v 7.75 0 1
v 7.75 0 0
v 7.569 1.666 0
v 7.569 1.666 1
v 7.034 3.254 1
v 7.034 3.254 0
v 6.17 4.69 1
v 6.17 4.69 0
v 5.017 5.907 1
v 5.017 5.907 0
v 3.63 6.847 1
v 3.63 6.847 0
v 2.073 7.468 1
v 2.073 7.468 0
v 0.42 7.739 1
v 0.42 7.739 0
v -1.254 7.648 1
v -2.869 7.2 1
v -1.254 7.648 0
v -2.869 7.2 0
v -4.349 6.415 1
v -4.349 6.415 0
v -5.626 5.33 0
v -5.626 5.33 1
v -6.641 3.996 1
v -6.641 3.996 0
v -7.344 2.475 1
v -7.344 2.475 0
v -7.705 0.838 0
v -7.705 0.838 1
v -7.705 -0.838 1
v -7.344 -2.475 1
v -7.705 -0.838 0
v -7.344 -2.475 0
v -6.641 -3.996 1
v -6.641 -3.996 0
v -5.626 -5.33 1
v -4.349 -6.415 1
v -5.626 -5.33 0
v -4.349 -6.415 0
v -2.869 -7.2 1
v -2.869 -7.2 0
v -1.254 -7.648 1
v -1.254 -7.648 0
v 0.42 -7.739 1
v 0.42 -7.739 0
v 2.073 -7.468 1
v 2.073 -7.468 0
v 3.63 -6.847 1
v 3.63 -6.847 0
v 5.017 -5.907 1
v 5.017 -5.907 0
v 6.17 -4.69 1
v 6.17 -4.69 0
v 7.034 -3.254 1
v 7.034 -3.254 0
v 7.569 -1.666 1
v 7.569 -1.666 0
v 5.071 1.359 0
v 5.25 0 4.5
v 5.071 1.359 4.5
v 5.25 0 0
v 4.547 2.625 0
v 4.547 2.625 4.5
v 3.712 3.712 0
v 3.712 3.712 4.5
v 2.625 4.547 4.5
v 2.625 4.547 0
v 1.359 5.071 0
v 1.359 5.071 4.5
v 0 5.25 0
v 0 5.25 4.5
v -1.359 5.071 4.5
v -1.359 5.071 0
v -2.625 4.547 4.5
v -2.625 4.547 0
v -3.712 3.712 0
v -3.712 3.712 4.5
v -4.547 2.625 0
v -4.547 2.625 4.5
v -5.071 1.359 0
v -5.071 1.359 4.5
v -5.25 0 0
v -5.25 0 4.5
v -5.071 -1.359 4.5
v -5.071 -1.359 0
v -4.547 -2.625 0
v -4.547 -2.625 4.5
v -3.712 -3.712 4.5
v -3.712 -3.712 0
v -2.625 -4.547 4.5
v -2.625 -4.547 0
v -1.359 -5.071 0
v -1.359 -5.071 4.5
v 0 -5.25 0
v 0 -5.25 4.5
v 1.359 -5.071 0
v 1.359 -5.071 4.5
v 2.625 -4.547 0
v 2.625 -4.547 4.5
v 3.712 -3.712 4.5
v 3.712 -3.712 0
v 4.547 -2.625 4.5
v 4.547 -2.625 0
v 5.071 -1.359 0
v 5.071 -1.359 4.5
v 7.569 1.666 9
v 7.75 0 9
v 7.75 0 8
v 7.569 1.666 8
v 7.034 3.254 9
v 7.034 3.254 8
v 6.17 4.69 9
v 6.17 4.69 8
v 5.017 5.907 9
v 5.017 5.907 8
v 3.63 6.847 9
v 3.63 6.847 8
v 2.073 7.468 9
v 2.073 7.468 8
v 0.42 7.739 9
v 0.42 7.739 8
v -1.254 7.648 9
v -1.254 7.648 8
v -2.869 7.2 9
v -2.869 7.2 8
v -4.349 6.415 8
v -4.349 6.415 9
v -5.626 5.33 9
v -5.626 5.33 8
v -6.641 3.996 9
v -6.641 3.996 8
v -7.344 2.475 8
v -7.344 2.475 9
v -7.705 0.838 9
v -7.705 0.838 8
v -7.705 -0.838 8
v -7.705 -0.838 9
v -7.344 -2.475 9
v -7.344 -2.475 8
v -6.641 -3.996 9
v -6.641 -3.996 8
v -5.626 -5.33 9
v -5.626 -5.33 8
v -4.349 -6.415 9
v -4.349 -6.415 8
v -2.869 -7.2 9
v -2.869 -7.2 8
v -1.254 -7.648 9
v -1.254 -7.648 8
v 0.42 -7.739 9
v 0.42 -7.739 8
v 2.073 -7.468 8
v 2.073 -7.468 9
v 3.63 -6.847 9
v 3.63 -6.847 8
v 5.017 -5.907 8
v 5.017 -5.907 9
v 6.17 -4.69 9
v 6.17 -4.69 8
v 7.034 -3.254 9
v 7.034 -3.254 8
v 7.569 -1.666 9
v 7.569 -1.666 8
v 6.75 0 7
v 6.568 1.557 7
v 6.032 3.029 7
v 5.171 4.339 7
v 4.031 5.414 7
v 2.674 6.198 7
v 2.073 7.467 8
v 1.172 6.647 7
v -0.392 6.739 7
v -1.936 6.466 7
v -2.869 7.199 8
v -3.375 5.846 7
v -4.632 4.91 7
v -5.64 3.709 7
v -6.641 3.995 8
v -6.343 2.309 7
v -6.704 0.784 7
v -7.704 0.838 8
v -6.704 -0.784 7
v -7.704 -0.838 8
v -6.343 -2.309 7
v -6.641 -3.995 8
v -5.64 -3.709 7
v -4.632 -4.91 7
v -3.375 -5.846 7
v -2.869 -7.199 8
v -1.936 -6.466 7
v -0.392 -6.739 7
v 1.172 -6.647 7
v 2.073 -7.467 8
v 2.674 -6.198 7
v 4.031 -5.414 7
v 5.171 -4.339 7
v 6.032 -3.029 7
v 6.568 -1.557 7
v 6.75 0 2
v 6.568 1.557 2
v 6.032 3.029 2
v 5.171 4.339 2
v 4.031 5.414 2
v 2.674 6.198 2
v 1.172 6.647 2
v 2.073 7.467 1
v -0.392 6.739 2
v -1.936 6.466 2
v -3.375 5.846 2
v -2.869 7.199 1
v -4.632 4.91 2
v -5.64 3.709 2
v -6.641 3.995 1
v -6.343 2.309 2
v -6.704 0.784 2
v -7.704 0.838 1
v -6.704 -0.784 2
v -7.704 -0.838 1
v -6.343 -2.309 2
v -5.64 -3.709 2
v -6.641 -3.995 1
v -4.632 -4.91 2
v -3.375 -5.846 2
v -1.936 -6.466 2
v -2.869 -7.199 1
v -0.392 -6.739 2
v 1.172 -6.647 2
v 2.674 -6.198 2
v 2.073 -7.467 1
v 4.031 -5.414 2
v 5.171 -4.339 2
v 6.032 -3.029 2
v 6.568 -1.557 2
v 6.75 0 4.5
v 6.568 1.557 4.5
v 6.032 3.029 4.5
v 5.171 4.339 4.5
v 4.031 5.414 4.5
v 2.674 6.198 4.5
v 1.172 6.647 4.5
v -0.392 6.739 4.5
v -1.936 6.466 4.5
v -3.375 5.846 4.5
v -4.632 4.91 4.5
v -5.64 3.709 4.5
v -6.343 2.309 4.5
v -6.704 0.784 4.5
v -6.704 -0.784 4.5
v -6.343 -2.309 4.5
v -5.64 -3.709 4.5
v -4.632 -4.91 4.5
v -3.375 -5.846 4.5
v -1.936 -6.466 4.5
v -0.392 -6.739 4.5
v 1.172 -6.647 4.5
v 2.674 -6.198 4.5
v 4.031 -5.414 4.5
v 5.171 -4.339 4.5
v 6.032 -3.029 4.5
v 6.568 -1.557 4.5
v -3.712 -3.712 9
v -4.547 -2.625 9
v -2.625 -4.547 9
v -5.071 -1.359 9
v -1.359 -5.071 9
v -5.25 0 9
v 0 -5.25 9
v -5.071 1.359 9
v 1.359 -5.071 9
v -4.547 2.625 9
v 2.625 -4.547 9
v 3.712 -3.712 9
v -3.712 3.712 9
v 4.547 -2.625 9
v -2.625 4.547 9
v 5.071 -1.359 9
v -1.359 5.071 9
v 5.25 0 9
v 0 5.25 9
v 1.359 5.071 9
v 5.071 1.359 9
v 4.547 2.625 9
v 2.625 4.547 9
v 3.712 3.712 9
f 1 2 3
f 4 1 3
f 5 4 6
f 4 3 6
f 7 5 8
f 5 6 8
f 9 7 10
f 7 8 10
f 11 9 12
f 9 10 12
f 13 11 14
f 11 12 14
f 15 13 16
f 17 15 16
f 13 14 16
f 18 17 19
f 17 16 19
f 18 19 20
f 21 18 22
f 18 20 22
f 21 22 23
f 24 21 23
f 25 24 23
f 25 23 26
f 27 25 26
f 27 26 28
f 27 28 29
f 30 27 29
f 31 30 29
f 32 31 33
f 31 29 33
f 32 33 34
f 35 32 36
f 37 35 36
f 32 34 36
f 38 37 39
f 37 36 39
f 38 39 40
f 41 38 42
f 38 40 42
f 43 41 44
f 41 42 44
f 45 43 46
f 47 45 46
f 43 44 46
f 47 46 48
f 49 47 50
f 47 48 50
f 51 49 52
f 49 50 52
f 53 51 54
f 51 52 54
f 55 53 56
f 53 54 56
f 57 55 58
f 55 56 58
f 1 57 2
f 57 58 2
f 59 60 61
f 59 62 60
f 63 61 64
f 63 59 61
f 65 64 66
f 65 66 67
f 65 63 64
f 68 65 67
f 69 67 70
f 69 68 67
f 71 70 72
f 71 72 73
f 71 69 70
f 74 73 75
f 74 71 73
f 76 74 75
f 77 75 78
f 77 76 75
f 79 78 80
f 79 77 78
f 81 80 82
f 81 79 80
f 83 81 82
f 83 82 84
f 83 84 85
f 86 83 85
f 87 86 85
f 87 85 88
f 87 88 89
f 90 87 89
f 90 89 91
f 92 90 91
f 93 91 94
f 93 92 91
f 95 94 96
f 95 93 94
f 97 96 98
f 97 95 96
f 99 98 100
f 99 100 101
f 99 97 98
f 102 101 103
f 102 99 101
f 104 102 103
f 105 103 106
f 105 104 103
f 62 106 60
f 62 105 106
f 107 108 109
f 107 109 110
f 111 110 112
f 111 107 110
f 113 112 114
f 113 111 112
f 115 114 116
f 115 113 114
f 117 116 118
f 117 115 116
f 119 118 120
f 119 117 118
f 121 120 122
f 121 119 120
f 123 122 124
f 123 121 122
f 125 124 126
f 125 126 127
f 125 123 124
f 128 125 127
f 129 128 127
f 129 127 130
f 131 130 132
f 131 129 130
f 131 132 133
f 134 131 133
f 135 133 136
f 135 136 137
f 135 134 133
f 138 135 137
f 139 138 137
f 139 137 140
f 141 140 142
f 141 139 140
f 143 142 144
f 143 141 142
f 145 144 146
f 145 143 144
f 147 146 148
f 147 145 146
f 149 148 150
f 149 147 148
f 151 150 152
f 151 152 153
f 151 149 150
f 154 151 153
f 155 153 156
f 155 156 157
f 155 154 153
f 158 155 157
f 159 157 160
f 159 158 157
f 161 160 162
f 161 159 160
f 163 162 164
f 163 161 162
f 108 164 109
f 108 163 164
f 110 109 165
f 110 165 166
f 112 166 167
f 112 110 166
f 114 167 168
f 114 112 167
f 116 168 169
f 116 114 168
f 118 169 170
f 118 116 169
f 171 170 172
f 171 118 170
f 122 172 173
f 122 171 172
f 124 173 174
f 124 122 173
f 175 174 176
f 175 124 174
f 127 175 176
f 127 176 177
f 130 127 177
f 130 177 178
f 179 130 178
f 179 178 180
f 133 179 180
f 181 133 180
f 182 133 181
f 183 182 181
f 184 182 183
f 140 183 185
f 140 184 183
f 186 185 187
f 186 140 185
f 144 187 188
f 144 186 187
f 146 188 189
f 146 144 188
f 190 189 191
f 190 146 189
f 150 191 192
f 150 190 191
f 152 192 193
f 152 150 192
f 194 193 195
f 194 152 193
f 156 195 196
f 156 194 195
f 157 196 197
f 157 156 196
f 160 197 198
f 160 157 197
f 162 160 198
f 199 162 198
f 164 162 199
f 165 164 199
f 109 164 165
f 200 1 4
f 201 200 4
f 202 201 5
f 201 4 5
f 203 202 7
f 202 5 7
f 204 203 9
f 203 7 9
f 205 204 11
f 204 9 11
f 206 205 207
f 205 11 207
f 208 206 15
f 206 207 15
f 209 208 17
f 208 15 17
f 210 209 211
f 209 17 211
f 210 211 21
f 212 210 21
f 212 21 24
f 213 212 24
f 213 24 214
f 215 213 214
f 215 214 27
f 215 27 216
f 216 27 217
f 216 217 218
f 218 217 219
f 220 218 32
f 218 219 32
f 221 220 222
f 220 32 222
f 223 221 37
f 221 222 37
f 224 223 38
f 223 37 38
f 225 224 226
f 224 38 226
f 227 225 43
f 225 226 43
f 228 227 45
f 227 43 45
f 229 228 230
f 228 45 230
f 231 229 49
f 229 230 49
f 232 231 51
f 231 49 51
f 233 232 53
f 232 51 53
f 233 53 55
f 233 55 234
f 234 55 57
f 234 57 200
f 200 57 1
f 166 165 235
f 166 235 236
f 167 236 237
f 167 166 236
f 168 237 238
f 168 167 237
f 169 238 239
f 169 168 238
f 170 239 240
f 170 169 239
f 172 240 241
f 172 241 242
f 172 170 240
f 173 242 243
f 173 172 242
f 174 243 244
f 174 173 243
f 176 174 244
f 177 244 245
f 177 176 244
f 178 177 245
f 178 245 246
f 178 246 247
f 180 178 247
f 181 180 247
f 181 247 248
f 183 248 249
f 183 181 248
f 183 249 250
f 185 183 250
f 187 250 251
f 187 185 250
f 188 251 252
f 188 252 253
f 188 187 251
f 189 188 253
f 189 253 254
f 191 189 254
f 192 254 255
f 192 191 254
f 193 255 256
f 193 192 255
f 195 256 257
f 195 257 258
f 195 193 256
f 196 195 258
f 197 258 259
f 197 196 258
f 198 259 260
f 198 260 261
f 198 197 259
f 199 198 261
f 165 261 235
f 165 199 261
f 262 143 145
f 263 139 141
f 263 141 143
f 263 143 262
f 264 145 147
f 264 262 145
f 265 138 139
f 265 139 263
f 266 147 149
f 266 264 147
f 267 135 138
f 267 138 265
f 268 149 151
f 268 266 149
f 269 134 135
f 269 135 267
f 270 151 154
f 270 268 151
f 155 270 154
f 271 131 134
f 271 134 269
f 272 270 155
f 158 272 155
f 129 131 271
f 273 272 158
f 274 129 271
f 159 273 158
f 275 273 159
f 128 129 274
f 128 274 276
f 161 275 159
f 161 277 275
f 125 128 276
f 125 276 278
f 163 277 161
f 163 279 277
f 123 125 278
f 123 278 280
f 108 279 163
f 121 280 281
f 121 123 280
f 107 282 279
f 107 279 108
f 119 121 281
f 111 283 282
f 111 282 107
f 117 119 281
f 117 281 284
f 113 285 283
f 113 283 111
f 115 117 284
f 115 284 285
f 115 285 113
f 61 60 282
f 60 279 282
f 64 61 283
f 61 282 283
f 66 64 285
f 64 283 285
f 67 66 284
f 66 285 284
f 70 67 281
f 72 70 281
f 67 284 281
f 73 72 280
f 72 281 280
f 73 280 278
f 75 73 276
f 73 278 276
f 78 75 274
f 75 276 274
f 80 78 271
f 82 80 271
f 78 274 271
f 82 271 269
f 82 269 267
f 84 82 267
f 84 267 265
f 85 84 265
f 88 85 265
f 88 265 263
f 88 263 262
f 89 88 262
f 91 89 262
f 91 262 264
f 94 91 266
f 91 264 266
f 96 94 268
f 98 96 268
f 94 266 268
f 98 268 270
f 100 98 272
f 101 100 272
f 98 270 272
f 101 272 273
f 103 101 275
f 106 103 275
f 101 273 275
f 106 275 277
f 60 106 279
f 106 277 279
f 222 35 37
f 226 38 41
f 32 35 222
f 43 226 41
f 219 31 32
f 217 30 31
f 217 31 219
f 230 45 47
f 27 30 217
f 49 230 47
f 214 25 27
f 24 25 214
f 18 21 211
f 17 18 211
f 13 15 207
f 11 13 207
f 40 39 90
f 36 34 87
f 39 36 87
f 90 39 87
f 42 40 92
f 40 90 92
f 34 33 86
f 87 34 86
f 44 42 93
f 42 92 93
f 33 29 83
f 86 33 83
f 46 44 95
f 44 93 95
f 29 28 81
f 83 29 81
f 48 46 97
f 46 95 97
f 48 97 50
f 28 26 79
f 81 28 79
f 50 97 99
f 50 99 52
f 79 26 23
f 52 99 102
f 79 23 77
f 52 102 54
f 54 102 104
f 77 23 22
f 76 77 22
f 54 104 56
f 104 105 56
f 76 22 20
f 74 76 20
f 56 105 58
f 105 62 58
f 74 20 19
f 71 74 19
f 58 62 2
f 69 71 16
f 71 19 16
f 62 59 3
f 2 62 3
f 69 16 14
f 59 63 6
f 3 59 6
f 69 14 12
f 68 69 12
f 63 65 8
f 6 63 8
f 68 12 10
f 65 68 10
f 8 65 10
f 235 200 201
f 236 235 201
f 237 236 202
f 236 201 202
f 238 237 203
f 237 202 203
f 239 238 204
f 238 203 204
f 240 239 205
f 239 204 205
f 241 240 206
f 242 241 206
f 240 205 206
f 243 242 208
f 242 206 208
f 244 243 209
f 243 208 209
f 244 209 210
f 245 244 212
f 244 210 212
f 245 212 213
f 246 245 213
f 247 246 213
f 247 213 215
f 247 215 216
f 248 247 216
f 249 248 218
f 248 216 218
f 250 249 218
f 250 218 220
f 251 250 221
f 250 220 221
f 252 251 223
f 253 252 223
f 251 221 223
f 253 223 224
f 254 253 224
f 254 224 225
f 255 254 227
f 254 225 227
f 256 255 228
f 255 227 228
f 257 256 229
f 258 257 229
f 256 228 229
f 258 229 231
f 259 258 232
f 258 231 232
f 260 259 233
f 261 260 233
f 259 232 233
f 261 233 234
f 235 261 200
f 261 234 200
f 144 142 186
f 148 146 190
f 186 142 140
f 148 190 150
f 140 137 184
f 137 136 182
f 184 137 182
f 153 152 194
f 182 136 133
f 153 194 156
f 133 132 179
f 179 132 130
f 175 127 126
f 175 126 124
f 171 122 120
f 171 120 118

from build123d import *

# Parameters (mm, degrees)
SKETCH1_R           = 7.75
SKETCH1_R_2         = 5.25
BOSS_EXTRUDE1_DEPTH = 1
SKETCH2_R           = 6.75
SKETCH2_R_2         = 5.25
BOSS_EXTRUDE2_DEPTH = 3.5
CHAMFER1_SIZE       = 1


with BuildPart() as part:
    # Sketch1 → Boss-Extrude1 (new body)
    with BuildSketch(Plane.XY):
        Circle(SKETCH1_R)
        Circle(SKETCH1_R_2, mode=Mode.SUBTRACT)
    extrude(amount=BOSS_EXTRUDE1_DEPTH)

    # Sketch2 → Boss-Extrude2 (add)
    with BuildSketch(Plane.XY.offset(1)):
        Circle(SKETCH2_R)
        Circle(SKETCH2_R_2, mode=Mode.SUBTRACT)
    extrude(amount=BOSS_EXTRUDE2_DEPTH)

    # Chamfer1
    chamfer1_edges = [part.edges().sort_by_distance(p)[0] for p in [
        (-6.75, 0, 1),
    ]]
    chamfer(chamfer1_edges, length=CHAMFER1_SIZE - 0.0001)  # a hair under: the kernel refuses the full size

    # Mirror5: part across plane


with BuildPart() as part_1:
    add(part.part)
    add(part.part.mirror(Plane.XY.offset(4.5)))


solid = part_1.part
